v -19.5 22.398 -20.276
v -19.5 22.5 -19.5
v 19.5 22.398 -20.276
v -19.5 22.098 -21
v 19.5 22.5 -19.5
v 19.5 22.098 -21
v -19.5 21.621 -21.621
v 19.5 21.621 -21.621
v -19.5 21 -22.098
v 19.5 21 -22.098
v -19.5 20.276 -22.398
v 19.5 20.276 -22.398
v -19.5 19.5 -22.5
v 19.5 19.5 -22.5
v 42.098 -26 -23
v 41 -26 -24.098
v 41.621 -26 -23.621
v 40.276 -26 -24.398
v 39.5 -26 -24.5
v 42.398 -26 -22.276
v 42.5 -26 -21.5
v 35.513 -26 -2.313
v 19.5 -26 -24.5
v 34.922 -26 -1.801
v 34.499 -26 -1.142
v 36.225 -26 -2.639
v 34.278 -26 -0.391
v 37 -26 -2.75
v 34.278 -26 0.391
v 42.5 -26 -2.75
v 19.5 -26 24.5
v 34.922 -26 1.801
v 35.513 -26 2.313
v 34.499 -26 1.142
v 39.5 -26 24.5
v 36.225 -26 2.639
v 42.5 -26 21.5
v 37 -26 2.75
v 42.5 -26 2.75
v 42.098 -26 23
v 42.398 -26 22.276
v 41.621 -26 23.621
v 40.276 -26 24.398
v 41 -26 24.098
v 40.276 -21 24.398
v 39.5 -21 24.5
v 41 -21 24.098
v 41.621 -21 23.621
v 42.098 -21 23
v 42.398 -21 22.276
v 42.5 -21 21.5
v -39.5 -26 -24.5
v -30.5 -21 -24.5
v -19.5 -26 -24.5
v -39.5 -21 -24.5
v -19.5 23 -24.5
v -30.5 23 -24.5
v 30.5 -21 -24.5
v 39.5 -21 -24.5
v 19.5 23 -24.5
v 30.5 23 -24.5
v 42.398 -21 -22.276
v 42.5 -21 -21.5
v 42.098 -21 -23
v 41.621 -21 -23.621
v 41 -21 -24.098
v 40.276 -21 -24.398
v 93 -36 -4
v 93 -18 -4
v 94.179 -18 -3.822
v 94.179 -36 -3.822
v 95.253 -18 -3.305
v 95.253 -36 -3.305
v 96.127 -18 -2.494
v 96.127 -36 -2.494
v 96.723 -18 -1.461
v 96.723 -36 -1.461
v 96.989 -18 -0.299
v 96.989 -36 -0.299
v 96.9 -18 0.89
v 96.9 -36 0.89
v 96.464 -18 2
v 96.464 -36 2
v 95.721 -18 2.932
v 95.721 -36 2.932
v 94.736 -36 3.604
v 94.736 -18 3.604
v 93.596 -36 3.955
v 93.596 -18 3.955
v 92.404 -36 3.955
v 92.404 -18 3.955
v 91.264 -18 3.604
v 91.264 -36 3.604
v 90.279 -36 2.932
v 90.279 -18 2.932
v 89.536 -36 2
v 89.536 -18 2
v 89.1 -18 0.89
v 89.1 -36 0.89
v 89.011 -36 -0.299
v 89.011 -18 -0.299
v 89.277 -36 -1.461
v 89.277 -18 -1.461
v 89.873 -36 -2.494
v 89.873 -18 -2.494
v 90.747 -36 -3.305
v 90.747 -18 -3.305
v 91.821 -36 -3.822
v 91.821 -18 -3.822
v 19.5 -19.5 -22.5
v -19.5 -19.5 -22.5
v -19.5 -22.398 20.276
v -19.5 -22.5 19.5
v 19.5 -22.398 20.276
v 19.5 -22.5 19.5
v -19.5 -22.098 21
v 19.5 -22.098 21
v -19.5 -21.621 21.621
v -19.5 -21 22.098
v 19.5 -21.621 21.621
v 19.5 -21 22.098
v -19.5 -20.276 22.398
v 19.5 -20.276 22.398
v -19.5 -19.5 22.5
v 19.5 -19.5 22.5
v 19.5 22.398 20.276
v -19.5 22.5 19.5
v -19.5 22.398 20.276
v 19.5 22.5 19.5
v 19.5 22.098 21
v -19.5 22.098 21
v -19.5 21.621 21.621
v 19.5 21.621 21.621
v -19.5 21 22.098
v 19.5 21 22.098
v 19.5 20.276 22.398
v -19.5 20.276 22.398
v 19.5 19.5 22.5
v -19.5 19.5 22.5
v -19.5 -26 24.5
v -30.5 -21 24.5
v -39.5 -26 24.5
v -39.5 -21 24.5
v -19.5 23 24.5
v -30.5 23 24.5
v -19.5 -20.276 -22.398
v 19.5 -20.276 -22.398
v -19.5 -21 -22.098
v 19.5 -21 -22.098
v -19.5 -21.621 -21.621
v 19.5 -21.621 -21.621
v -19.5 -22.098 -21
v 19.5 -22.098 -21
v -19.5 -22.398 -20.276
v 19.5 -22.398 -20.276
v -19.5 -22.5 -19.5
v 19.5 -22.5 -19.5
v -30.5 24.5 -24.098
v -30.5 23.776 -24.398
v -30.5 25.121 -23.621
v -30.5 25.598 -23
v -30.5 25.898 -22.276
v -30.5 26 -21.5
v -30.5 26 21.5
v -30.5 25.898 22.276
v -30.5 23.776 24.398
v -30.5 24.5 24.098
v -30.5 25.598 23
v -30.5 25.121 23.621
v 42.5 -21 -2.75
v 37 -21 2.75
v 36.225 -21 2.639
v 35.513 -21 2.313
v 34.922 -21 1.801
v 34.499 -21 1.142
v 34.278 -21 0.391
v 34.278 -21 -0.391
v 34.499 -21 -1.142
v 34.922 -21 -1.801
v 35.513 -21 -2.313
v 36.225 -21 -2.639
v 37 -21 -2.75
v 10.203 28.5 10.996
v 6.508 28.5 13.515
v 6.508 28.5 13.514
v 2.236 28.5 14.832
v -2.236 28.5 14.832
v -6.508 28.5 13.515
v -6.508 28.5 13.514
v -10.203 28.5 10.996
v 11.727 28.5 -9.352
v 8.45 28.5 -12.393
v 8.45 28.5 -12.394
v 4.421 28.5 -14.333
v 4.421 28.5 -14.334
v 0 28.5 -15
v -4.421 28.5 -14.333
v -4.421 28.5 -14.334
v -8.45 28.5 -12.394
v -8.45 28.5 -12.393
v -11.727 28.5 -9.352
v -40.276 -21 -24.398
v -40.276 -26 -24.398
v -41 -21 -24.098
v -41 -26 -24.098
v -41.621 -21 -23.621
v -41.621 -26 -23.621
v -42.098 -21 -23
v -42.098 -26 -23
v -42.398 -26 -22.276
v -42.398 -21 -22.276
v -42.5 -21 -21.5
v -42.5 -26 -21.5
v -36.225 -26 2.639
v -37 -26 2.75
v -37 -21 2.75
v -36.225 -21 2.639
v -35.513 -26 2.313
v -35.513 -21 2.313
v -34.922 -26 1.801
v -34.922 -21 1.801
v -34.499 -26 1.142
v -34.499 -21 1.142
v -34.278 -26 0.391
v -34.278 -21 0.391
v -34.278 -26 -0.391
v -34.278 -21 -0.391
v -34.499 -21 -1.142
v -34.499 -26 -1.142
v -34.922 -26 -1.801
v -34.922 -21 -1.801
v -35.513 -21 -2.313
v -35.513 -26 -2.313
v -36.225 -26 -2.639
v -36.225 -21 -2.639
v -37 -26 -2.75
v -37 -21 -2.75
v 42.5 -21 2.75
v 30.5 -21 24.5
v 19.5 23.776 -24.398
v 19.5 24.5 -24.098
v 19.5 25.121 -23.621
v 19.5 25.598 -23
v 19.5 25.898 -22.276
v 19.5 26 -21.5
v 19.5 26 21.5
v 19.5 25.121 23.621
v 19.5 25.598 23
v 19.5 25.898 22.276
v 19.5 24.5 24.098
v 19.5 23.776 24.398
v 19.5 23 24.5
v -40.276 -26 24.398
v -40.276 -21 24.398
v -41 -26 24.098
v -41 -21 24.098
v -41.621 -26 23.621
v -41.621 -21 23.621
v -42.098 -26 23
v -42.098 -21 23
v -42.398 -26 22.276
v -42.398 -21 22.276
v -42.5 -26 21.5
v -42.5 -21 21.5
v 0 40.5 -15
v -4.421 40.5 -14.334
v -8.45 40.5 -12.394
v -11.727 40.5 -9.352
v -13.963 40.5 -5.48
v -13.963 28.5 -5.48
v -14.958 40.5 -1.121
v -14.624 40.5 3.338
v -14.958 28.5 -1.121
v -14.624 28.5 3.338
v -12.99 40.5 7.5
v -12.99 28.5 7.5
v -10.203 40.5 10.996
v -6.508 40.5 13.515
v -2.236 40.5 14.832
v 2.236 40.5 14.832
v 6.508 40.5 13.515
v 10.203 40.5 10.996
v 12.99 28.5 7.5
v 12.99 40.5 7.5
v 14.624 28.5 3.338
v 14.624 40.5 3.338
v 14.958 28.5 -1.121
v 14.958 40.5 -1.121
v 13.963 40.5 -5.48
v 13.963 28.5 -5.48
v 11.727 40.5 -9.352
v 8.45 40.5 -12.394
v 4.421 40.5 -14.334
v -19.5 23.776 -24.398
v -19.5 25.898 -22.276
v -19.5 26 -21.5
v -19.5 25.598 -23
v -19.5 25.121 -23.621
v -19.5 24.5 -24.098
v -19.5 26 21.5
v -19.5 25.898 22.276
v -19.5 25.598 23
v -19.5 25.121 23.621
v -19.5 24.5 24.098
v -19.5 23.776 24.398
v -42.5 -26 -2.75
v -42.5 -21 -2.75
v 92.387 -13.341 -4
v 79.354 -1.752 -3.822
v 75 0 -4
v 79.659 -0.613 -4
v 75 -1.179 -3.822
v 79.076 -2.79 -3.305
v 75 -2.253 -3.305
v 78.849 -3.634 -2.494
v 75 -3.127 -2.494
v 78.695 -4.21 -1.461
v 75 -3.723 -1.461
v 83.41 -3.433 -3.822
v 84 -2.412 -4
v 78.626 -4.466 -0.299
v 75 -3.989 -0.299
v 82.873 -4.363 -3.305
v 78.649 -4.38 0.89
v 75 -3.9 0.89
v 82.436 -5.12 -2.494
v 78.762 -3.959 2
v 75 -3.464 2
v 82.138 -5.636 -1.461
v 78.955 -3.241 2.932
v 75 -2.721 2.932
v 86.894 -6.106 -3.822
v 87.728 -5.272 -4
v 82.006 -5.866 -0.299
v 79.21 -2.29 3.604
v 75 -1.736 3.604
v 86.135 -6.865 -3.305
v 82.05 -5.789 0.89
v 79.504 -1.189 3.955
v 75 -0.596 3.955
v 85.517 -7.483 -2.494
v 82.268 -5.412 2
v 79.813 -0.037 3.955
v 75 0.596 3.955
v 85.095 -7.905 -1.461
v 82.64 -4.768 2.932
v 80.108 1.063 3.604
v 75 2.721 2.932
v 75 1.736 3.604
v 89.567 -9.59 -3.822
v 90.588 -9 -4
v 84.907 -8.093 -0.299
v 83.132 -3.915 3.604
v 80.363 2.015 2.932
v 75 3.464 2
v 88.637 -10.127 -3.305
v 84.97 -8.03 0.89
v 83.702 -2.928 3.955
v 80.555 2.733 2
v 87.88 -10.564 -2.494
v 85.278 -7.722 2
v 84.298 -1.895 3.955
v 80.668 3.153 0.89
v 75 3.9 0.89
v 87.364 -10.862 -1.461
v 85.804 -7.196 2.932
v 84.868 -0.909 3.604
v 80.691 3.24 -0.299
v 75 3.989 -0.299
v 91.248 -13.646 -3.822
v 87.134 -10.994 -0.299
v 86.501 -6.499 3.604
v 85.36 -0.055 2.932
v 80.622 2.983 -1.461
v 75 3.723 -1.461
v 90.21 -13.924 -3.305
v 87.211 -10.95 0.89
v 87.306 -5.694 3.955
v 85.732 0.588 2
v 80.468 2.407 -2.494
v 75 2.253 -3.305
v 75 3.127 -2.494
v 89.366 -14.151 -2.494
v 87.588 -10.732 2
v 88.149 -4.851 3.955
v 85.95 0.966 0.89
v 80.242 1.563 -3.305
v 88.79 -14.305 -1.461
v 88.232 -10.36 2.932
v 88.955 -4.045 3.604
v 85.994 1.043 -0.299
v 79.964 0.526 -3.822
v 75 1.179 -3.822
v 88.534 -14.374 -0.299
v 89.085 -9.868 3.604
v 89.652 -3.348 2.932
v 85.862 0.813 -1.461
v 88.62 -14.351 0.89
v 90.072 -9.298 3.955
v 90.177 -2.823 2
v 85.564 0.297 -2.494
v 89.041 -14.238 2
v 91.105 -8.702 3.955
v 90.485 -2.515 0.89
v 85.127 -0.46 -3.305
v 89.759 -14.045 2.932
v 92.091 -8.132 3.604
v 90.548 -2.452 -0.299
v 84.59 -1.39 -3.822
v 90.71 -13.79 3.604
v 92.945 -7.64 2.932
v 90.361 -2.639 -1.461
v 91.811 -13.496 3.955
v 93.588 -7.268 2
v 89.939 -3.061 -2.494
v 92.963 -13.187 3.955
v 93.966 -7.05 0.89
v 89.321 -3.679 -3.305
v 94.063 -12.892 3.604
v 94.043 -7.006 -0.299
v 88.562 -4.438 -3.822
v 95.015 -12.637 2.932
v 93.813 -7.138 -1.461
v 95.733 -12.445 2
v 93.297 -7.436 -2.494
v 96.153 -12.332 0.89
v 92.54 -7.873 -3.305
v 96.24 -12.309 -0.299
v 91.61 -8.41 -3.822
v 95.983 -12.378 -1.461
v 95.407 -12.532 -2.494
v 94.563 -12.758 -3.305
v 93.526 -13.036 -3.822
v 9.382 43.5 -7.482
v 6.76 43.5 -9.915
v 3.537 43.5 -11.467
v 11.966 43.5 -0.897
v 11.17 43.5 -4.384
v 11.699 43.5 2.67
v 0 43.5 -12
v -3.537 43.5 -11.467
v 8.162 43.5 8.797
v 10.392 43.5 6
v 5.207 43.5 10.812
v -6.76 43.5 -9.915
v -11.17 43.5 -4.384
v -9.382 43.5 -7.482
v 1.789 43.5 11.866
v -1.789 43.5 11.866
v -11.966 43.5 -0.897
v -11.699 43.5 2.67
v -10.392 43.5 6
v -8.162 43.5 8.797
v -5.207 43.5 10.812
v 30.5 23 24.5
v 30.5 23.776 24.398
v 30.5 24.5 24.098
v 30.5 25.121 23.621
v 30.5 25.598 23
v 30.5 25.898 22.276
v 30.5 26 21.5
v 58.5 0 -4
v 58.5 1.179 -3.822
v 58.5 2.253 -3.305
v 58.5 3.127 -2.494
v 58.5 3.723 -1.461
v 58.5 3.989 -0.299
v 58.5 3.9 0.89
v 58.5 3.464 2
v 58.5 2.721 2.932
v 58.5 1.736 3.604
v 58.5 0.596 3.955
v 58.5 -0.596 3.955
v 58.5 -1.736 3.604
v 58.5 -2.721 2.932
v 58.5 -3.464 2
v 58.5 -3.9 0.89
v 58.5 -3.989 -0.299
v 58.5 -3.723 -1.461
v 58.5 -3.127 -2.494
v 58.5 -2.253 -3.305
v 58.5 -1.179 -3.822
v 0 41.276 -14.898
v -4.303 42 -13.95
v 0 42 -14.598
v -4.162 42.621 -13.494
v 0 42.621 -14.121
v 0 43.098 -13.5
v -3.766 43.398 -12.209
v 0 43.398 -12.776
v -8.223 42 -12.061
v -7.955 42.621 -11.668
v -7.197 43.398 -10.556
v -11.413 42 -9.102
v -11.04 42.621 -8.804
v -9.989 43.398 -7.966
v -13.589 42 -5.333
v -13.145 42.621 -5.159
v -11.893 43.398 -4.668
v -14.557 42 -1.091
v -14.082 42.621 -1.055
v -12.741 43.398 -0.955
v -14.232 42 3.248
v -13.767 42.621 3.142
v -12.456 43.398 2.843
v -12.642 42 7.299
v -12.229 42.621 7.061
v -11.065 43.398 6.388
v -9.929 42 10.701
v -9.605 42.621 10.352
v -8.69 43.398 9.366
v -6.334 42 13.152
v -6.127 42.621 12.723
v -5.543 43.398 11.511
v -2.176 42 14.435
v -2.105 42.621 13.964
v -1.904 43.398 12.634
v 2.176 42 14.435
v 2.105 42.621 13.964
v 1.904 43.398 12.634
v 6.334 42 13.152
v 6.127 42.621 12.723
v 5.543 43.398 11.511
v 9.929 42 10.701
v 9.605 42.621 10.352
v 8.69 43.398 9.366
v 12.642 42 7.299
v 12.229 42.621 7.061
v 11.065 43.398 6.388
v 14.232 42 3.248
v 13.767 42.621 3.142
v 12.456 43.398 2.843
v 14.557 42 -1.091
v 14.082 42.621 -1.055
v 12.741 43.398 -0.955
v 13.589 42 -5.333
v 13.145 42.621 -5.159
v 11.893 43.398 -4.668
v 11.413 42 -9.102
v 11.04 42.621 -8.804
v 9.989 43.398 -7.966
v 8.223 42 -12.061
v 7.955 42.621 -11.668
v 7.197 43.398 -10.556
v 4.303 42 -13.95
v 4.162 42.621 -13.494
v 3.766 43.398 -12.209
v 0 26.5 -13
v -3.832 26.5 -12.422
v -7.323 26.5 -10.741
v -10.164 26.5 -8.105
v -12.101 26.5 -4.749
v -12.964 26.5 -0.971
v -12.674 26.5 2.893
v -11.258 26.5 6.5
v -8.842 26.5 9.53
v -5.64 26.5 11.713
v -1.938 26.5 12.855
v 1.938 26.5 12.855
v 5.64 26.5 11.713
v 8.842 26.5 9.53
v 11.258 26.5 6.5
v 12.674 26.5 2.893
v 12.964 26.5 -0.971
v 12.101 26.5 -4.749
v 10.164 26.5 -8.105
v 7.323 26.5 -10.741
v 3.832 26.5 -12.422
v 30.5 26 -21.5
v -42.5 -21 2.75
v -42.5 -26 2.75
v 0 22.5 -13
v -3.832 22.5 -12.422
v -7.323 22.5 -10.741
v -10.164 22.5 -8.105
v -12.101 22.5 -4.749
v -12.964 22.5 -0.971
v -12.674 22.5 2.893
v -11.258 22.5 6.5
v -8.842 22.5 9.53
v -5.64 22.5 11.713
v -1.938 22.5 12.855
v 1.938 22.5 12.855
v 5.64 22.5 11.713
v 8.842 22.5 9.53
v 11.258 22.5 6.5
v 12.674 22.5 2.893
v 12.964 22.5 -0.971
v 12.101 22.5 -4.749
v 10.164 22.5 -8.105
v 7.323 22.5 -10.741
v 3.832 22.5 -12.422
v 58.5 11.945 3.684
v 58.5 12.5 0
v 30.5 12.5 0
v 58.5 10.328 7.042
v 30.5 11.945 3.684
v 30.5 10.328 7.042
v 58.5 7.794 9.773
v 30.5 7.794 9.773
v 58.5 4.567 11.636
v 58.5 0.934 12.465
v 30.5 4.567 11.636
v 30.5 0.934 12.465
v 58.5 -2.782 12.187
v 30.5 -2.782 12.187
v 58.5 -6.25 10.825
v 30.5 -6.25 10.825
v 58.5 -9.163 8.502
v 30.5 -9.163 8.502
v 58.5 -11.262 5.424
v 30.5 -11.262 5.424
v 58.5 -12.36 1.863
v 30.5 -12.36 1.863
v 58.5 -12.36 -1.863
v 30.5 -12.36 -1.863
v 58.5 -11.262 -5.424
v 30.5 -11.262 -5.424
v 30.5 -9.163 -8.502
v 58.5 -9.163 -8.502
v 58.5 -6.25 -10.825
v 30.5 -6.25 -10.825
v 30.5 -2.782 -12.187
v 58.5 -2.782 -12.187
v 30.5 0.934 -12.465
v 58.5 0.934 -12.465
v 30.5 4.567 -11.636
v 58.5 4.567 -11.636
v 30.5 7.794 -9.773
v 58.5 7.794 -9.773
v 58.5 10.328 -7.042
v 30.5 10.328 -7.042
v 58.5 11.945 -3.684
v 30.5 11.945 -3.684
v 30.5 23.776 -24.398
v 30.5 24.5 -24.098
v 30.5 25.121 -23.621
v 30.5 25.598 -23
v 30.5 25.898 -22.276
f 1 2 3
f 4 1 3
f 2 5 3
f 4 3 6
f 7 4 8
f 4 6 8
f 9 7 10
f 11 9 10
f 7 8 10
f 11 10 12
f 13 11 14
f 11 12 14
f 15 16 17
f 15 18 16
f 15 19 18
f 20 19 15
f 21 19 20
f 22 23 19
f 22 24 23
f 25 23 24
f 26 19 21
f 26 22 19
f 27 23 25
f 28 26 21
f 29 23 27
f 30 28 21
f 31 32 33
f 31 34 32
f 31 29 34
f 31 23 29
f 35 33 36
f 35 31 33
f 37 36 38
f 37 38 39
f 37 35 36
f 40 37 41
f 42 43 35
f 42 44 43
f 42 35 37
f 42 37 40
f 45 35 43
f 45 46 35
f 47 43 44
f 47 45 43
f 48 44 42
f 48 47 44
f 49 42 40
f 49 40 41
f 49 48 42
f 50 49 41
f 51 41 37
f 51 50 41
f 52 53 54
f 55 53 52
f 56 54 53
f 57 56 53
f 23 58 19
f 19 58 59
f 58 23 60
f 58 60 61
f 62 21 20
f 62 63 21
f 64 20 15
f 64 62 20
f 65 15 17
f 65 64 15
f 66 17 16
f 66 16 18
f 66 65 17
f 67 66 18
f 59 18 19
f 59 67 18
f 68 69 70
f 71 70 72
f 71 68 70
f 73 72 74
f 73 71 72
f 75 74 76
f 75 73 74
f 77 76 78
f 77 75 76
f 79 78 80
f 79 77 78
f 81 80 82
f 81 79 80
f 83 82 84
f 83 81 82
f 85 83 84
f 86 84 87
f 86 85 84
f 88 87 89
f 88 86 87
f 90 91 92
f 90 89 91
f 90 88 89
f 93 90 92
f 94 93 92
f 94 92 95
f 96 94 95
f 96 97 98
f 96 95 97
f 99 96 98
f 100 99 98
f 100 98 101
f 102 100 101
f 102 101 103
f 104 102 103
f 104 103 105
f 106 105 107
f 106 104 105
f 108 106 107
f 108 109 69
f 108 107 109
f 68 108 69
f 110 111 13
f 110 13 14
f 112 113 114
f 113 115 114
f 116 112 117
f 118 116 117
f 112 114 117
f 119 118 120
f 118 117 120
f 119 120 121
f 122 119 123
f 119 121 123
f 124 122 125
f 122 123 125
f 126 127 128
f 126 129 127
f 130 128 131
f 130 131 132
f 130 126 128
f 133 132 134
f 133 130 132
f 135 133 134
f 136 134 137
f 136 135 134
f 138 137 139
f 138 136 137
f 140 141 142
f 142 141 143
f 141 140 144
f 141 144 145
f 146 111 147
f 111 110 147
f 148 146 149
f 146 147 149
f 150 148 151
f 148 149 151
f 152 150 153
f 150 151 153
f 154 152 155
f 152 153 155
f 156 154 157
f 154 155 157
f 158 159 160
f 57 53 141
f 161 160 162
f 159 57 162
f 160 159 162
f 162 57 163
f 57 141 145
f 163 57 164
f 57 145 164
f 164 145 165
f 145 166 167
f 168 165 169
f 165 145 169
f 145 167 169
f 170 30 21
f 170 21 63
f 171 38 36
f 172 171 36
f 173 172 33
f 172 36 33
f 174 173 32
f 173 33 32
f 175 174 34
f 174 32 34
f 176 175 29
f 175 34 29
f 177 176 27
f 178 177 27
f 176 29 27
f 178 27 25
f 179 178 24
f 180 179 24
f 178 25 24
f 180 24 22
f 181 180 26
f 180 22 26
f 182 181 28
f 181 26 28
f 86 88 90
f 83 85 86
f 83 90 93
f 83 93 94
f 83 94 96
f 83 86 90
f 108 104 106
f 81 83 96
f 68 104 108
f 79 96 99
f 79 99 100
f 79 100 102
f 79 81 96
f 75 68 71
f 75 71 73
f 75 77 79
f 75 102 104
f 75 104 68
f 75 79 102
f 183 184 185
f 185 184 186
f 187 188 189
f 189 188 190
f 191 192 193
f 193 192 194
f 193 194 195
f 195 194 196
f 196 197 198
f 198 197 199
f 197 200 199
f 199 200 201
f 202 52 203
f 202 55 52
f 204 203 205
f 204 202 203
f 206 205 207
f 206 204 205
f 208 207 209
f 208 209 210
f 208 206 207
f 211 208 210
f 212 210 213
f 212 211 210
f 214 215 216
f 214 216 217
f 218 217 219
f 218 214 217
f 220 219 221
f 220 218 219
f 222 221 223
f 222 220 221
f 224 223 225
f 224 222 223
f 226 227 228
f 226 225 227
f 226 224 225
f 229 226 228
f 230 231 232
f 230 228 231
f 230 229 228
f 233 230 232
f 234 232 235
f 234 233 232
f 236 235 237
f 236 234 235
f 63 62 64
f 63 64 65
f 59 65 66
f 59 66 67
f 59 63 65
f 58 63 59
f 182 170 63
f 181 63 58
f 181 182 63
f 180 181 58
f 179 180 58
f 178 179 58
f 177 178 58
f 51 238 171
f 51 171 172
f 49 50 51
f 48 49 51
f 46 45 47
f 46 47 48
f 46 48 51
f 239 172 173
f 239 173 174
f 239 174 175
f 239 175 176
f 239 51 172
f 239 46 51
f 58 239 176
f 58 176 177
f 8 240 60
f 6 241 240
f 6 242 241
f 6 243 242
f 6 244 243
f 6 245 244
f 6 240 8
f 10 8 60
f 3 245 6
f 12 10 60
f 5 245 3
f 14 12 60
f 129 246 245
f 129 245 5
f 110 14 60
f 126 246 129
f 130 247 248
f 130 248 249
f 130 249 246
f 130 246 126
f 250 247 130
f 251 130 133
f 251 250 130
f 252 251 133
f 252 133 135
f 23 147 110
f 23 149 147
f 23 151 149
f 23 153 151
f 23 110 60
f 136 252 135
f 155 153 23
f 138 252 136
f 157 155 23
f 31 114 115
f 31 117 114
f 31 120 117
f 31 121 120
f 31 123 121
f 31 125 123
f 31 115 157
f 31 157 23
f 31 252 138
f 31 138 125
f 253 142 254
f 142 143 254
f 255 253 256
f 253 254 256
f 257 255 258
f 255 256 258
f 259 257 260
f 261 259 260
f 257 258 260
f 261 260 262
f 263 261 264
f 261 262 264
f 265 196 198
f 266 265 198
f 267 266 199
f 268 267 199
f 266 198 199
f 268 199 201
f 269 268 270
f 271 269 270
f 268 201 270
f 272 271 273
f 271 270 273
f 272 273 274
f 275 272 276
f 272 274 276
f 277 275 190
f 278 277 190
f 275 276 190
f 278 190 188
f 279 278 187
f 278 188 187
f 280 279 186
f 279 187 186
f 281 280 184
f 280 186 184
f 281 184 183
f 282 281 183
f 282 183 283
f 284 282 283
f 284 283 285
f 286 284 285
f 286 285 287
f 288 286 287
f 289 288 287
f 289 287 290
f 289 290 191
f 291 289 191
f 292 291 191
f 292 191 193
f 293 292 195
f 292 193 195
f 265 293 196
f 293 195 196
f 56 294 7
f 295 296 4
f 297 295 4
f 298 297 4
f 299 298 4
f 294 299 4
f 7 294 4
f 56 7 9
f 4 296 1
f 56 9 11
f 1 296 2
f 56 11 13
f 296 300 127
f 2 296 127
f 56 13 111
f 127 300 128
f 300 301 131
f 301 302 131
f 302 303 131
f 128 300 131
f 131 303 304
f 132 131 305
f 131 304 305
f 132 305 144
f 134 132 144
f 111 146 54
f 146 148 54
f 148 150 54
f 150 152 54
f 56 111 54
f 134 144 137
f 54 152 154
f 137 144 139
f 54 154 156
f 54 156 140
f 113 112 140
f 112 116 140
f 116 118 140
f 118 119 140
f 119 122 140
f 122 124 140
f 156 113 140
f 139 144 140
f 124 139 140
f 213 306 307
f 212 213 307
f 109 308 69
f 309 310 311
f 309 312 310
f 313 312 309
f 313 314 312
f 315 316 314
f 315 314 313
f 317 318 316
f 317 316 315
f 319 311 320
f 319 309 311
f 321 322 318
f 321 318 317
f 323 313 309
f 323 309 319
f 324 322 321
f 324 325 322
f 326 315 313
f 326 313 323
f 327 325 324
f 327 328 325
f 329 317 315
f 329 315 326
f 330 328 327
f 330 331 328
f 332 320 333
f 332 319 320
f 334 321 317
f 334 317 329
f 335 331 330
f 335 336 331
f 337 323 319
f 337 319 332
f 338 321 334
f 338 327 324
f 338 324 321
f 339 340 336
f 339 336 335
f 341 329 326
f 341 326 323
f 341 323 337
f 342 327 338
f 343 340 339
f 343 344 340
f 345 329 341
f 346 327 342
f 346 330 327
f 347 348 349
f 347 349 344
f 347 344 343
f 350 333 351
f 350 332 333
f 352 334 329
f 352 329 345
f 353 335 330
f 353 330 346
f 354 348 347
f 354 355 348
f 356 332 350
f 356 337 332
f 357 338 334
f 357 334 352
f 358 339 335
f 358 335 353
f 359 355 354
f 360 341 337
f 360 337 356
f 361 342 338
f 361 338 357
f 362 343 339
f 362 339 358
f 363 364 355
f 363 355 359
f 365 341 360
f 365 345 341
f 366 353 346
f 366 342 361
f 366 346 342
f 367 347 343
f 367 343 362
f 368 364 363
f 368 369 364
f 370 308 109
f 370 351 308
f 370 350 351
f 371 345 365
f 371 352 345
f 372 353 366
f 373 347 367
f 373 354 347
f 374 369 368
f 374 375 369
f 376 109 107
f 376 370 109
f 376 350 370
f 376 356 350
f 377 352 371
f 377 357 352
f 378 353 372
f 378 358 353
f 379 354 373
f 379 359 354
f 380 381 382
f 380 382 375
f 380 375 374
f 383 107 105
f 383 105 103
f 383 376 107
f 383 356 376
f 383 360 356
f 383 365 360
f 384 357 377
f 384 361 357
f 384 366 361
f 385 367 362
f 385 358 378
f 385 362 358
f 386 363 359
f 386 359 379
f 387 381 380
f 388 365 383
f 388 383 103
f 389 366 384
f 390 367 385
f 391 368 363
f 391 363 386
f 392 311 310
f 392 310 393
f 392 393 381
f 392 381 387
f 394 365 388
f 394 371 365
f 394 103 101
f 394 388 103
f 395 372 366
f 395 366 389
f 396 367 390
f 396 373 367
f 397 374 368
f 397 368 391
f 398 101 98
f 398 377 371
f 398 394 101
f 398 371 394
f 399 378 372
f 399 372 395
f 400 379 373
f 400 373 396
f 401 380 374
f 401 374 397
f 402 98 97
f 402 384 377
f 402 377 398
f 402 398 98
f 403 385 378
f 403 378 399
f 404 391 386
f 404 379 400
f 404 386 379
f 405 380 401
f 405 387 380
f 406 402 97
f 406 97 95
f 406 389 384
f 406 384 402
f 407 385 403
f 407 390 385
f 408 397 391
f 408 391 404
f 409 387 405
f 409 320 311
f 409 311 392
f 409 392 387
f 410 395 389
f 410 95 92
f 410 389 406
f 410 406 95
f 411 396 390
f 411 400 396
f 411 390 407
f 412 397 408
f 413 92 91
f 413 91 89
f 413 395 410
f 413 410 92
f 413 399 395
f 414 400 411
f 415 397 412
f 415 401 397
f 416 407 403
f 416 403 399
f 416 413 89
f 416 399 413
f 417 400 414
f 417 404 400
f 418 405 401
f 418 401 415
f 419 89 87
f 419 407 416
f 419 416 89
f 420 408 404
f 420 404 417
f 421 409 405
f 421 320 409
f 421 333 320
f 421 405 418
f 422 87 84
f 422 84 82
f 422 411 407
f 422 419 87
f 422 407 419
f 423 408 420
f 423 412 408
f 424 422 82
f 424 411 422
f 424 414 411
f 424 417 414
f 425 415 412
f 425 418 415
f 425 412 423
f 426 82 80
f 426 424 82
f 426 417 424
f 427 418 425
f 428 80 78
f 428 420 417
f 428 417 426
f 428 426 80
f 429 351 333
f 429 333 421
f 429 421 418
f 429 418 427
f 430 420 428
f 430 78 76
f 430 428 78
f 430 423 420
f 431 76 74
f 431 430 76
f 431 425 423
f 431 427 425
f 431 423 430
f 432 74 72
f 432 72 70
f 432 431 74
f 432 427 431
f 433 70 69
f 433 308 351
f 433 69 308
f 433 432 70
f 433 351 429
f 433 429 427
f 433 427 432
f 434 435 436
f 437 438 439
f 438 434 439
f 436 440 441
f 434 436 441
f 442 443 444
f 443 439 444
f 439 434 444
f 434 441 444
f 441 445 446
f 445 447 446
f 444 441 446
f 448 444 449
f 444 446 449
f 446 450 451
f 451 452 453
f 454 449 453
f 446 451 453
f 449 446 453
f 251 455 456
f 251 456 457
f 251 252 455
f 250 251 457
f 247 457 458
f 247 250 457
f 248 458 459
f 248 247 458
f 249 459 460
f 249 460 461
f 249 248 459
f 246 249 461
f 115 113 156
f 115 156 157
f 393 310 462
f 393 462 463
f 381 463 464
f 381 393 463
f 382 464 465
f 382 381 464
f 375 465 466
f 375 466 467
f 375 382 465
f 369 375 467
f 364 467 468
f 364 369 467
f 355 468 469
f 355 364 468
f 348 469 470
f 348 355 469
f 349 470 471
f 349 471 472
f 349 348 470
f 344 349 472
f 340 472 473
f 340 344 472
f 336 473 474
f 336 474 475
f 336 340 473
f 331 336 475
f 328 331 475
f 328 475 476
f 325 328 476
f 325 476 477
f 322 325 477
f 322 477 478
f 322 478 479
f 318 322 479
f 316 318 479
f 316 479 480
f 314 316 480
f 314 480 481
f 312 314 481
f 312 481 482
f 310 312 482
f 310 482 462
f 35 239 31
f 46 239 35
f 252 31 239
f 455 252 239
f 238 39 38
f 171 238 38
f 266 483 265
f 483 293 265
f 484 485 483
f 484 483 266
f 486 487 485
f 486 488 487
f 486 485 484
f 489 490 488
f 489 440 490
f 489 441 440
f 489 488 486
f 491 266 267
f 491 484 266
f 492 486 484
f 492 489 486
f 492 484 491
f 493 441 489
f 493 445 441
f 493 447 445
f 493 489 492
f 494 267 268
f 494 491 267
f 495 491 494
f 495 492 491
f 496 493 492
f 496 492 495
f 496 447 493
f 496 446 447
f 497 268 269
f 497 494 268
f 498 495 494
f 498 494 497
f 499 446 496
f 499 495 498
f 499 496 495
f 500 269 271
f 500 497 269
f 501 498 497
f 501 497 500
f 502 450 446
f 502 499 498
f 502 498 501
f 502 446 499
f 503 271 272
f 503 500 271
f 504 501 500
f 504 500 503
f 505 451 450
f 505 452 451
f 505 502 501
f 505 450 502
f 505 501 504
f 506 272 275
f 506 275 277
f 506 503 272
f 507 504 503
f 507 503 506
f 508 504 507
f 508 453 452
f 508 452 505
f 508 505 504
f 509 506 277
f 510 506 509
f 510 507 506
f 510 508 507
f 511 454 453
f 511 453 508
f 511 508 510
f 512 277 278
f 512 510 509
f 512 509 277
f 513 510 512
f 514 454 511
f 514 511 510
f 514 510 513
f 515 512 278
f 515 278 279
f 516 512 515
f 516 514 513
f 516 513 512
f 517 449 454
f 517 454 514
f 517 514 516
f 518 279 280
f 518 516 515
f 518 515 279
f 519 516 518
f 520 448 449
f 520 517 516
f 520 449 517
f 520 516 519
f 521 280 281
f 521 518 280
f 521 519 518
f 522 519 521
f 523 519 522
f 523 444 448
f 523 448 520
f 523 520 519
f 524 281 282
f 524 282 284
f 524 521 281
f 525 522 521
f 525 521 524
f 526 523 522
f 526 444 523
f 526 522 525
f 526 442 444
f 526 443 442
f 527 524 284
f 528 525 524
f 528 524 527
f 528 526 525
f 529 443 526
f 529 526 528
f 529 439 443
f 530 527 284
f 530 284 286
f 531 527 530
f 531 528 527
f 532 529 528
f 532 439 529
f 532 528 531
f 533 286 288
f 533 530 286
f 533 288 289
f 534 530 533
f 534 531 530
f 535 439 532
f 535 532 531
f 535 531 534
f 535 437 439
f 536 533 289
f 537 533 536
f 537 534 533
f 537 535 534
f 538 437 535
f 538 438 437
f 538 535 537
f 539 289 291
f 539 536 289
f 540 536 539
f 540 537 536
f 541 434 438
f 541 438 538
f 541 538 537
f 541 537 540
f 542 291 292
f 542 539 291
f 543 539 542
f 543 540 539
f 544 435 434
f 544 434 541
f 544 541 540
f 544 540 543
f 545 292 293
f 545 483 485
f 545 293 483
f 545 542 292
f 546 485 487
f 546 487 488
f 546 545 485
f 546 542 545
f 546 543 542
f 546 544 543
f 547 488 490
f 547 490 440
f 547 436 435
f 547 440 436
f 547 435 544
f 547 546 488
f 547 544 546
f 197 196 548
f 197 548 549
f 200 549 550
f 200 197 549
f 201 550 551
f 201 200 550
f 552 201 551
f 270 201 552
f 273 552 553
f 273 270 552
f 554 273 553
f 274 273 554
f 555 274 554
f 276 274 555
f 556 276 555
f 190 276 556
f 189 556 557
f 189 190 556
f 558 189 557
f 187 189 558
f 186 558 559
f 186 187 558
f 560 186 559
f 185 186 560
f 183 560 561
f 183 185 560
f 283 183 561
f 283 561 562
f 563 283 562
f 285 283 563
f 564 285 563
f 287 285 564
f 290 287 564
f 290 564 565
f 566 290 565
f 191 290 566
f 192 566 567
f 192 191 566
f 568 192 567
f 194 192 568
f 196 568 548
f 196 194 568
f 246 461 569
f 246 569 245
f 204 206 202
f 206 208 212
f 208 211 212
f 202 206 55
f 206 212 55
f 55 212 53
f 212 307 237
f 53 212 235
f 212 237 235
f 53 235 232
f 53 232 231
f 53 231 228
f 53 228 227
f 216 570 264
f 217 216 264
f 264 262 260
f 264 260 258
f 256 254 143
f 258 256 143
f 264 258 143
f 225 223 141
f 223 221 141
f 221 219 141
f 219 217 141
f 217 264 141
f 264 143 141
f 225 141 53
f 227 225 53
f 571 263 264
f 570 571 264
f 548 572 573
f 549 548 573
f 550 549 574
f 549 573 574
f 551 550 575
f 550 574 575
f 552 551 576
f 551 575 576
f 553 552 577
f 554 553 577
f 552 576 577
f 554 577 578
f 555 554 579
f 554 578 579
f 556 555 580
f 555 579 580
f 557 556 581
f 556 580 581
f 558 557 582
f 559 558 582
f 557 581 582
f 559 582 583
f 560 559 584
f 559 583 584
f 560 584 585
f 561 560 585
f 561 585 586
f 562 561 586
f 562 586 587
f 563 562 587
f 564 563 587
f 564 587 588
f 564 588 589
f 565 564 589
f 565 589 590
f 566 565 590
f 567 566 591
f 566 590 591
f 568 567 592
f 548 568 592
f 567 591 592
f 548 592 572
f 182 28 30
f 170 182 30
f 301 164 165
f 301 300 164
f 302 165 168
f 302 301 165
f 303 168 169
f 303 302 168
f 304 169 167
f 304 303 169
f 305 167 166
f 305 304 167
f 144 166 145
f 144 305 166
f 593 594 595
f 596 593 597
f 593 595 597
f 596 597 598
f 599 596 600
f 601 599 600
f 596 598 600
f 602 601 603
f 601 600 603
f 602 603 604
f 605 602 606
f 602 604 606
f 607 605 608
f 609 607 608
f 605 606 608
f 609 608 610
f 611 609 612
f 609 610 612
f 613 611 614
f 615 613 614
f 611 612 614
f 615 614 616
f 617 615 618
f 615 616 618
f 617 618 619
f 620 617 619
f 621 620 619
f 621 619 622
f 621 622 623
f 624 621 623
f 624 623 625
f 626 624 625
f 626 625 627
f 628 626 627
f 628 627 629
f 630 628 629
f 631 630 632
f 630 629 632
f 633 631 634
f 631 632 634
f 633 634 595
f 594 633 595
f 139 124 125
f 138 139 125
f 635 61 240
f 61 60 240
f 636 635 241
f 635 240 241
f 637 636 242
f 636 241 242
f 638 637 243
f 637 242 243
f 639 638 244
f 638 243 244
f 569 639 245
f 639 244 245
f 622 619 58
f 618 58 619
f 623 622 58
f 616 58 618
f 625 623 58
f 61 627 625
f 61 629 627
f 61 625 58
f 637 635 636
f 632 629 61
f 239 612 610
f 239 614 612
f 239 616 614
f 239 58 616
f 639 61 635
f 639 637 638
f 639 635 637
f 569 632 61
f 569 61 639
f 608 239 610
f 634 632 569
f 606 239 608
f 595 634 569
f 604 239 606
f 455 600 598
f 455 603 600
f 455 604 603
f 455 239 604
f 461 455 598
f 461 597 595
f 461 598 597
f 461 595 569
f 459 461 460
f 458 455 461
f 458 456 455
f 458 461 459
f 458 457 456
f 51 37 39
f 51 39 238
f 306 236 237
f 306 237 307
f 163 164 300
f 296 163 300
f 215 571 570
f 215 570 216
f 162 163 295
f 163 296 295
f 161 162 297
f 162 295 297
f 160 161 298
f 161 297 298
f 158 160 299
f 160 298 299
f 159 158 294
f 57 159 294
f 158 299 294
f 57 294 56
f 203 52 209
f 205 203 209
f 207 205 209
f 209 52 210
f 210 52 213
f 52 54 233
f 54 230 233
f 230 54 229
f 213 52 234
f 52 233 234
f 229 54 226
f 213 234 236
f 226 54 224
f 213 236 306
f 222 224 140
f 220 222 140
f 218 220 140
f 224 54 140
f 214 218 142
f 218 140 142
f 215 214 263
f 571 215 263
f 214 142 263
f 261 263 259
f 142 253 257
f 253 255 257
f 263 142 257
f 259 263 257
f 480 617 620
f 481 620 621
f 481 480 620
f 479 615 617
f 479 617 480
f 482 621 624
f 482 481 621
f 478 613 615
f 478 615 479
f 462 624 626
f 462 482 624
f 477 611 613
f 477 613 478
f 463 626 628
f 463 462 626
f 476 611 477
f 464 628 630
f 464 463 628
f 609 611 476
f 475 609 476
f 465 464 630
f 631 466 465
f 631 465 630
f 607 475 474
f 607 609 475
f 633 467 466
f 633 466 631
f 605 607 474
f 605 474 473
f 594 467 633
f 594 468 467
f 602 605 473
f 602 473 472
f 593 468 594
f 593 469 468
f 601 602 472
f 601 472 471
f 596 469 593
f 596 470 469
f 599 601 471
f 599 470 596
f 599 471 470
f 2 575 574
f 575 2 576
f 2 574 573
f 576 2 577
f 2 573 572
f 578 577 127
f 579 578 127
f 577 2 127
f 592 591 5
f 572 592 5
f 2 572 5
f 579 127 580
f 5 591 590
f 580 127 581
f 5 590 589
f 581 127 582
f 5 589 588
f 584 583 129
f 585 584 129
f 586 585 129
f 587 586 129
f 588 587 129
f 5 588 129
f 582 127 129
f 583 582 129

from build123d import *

# Parameters (mm, degrees)
SKETCH_1_W          = 45
SKETCH_1_H          = 45
EXTRUDE_1_DEPTH     = 22.5
EXTRUDE_2_DEPTH     = 24.5
CUT_EXTRUDE_1_DEPTH = 72.48776119
CHAMFER_1_SIZE      = 2
FILLET_1_R          = 3
FILLET_2_R          = 3
SKETCH_5_R          = 12.5
EXTRUDE_3_DEPTH     = 28
SKETCH_6_R          = 4


with BuildPart() as part:
    # ｽｹｯﾁ1 → ﾎﾞｽ - 押し出し1 (new, symmetric)
    with BuildSketch(Plane.XY):
        Rectangle(SKETCH_1_W, SKETCH_1_H)
    extrude(amount=EXTRUDE_1_DEPTH, both=True)

    # ｽｹｯﾁ2 → ﾎﾞｽ - 押し出し2 (add, symmetric)
    with BuildSketch(Plane.XY):
        Polygon((-19.5, -26), (-42.5, -26), (-42.5, -21), (-30.5, -21), (-30.5, 26), (-19.5, 26), align=None)
    extrude_2 = extrude(amount=EXTRUDE_2_DEPTH, both=True)

    # ｽｹｯﾁ3 → ｶｯﾄ - 押し出し1 (cut, symmetric)
    with BuildSketch(Plane.XZ.offset(26)):
        with BuildLine():
            Line((-42.5, -2.75), (-42.5, 2.75))
            Line((-42.5, 2.75), (-37, 2.75))
            ThreePointArc((-37, 2.75), (-34.25, 0), (-37, -2.75))
            Line((-37, -2.75), (-42.5, -2.75))
        make_face()
    cut_extrude_1 = extrude(amount=CUT_EXTRUDE_1_DEPTH, both=True, mode=Mode.SUBTRACT)

    # ｽｹｯﾁ4 → 回転1 (revolve)
    with BuildSketch(Plane.XY, mode=Mode.PRIVATE) as revolve_1_sk:
        Polygon((0, 43.5), (-15, 43.5), (-15, 28.5), (-13, 28.5), (-13, 22.5), (0, 22.5), align=None)
    revolve(revolve_1_sk.sketch.rotate(Axis((0, 0, 0), (0, 1, 0)), 270), axis=Axis((0, 0, 0), (0, 1, 0)))

    # 面取り1
    chamfer_1_edges = [part.edges().sort_by_distance(p)[0] for p in [
        (0, 28.5, 13),
    ]]
    chamfer(chamfer_1_edges, length=CHAMFER_1_SIZE - 0.0001)  # a hair under: the kernel refuses the full size

    # ﾌｨﾚｯﾄ1
    fillet_1_edges = [part.edges().sort_by_distance(p)[0] for p in [
        (0, 43.5, 15),
    ]]
    fillet(fillet_1_edges, radius=FILLET_1_R)

    # ﾐﾗｰ1: ﾎﾞｽ - 押し出し2, ｶｯﾄ - 押し出し1 across plane
    add(extrude_2.mirror(Plane(origin=(0, 0, 0), x_dir=(0, 0, 1), z_dir=(1, 0, 0))))
    add(cut_extrude_1.mirror(Plane(origin=(0, 0, 0), x_dir=(0, 0, 1), z_dir=(1, 0, 0))), mode=Mode.SUBTRACT)

    # ﾌｨﾚｯﾄ2
    fillet_2_edges = [part.edges().sort_by_distance(p)[0] for p in [
        (0, -22.5, -22.5),
        (0, -22.5, 22.5),
        (-25, 26, -24.5),
        (-42.5, -23.5, -24.5),
        (-25, 26, 24.5),
        (-42.5, -23.5, 24.5),
        (0, 22.5, -22.5),
        (0, 22.5, 22.5),
        (42.5, -23.5, 24.5),
        (25, 26, 24.5),
        (25, 26, -24.5),
        (42.5, -23.5, -24.5),
    ]]
    fillet(fillet_2_edges, radius=FILLET_2_R)

    # ｽｹｯﾁ5 → ﾎﾞｽ - 押し出し3 (add)
    with BuildSketch(Plane(origin=(30.5, 0, 0), x_dir=(0, 0, -1), z_dir=(1, 0, 0))):
        with Locations(Location((0, 0, 0), (0, 0, 90))):
            Circle(SKETCH_5_R)
    extrude(amount=EXTRUDE_3_DEPTH)

    # ｽｲｰﾌﾟ1: sweep along a path in ｽｹｯﾁ9
    with BuildLine(Plane.XY) as sweep_1_path:
        Line((58.5, 0), (75, 0))
        ThreePointArc((75, 0), (87.727922061, -5.272077939), (93, -18))
        Line((93, -18), (93, -36))
    # ｽｹｯﾁ6 → ｽｲｰﾌﾟ1 (sweep)
    with BuildSketch(Plane(origin=(58.5, 0, 0), x_dir=(0, 0, -1), z_dir=(1, 0, 0))):
        Circle(SKETCH_6_R)
    sweep(path=sweep_1_path.line)


solid = part.part
